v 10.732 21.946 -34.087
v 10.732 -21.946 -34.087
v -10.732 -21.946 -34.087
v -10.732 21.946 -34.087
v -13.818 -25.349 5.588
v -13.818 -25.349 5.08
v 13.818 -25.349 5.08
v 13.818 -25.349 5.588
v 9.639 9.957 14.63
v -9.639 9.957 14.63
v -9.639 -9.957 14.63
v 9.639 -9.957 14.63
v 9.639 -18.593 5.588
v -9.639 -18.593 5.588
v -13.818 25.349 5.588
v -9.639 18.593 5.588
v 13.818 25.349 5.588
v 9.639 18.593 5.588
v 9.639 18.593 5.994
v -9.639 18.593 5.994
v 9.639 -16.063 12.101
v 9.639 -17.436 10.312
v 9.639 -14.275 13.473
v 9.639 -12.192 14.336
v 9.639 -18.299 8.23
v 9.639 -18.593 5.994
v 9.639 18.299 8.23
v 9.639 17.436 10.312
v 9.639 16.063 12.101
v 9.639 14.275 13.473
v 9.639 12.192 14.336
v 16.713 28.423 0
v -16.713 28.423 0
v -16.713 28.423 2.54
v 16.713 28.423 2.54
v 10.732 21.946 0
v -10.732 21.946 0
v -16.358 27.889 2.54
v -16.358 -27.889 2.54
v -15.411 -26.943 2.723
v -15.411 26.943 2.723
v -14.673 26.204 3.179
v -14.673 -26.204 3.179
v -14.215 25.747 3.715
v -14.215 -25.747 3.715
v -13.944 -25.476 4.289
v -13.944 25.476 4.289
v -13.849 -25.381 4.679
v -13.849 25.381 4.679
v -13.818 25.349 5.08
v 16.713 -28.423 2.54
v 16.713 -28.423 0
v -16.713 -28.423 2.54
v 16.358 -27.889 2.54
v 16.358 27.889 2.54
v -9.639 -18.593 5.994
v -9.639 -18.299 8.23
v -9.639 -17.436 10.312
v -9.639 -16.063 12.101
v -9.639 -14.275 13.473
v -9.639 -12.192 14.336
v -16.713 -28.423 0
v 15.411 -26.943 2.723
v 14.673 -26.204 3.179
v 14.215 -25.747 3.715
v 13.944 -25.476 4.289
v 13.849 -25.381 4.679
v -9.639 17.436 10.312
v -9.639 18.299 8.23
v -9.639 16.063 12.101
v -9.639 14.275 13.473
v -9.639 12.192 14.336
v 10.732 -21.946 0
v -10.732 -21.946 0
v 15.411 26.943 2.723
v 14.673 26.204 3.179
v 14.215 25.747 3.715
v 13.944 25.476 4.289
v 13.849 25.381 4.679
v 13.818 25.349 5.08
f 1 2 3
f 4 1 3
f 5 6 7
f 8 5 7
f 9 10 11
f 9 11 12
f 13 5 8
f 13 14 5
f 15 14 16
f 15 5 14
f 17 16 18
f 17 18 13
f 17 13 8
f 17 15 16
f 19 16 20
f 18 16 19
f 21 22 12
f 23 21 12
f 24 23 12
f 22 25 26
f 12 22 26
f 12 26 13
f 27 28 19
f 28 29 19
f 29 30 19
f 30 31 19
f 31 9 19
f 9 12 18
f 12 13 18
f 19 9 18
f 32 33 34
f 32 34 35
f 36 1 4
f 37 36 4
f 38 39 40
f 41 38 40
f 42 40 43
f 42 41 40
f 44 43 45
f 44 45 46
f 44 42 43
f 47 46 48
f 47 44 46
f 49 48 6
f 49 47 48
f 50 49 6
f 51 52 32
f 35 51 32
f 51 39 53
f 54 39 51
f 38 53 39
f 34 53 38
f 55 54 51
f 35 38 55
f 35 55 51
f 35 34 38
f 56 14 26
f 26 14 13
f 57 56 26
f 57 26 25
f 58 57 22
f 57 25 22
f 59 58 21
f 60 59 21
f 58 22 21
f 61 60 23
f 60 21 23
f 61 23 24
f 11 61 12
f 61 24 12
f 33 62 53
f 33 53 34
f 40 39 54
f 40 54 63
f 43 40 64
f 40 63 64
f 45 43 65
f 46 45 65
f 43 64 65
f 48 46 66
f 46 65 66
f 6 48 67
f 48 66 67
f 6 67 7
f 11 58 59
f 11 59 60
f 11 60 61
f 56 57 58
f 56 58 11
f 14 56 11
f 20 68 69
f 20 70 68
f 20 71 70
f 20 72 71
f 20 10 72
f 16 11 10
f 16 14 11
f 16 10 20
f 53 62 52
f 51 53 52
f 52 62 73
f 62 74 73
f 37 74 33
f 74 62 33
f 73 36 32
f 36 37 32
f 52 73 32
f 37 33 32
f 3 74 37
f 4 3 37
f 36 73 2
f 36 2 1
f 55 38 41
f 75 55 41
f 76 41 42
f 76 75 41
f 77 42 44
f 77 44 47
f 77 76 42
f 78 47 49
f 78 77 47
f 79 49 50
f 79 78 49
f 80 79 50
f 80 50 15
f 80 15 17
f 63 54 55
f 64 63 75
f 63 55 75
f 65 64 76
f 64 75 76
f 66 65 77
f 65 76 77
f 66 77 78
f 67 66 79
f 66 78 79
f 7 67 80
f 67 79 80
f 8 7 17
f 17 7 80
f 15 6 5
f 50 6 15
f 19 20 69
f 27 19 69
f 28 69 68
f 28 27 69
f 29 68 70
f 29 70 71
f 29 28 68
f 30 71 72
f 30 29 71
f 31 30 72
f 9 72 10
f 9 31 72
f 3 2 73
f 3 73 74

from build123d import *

# Parameters (mm, degrees)
SKETCH1_W           = 33.4264
SKETCH1_H           = 56.8452
BOSS_EXTRUDE1_DEPTH = 2.54
SKETCH2_W           = 27.6352
SKETCH2_H           = 50.6984
BOSS_EXTRUDE2_DEPTH = 3.048
SKETCH3_W           = 19.2786
SKETCH3_H           = 37.1856
BOSS_EXTRUDE3_DEPTH = 9.0424
FILLET1_R           = 2.54
FILLET7_R           = 8.636
SKETCH4_W           = 21.463
SKETCH4_H           = 43.8912
BOSS_EXTRUDE4_DEPTH = 34.0868


with BuildPart() as part:
    # Sketch1 → Boss-Extrude1 (new body)
    with BuildSketch(Plane.XY):
        Rectangle(SKETCH1_W, SKETCH1_H)
    extrude(amount=BOSS_EXTRUDE1_DEPTH)

    # Sketch2 → Boss-Extrude2 (add)
    with BuildSketch(Plane.XY.offset(2.54)):
        Rectangle(SKETCH2_W, SKETCH2_H)
    extrude(amount=BOSS_EXTRUDE2_DEPTH)

    # Sketch3 → Boss-Extrude3 (add)
    with BuildSketch(Plane.XY.offset(5.588)):
        Rectangle(SKETCH3_W, SKETCH3_H)
    extrude(amount=BOSS_EXTRUDE3_DEPTH)

    # Fillet1
    fillet1_edges = [part.edges().sort_by_distance(p)[0] for p in [
        (13.8176, 0, 2.54),
        (0, 25.3492, 2.54),
        (-13.8176, 0, 2.54),
        (0, -25.3492, 2.54),
    ]]
    fillet(fillet1_edges, radius=FILLET1_R)

    # Fillet7
    fillet7_edges = [part.edges().sort_by_distance(p)[0] for p in [
        (0, 18.5928, 14.6304),
        (0, -18.5928, 14.6304),
    ]]
    fillet(fillet7_edges, radius=FILLET7_R)

    # Sketch4 → Boss-Extrude4 (add)
    with BuildSketch(Plane(origin=(0, 0, 0), x_dir=(-1, 0, 0), z_dir=(0, 0, -1))):
        Rectangle(SKETCH4_W, SKETCH4_H)
    extrude(amount=BOSS_EXTRUDE4_DEPTH)


solid = part.part
